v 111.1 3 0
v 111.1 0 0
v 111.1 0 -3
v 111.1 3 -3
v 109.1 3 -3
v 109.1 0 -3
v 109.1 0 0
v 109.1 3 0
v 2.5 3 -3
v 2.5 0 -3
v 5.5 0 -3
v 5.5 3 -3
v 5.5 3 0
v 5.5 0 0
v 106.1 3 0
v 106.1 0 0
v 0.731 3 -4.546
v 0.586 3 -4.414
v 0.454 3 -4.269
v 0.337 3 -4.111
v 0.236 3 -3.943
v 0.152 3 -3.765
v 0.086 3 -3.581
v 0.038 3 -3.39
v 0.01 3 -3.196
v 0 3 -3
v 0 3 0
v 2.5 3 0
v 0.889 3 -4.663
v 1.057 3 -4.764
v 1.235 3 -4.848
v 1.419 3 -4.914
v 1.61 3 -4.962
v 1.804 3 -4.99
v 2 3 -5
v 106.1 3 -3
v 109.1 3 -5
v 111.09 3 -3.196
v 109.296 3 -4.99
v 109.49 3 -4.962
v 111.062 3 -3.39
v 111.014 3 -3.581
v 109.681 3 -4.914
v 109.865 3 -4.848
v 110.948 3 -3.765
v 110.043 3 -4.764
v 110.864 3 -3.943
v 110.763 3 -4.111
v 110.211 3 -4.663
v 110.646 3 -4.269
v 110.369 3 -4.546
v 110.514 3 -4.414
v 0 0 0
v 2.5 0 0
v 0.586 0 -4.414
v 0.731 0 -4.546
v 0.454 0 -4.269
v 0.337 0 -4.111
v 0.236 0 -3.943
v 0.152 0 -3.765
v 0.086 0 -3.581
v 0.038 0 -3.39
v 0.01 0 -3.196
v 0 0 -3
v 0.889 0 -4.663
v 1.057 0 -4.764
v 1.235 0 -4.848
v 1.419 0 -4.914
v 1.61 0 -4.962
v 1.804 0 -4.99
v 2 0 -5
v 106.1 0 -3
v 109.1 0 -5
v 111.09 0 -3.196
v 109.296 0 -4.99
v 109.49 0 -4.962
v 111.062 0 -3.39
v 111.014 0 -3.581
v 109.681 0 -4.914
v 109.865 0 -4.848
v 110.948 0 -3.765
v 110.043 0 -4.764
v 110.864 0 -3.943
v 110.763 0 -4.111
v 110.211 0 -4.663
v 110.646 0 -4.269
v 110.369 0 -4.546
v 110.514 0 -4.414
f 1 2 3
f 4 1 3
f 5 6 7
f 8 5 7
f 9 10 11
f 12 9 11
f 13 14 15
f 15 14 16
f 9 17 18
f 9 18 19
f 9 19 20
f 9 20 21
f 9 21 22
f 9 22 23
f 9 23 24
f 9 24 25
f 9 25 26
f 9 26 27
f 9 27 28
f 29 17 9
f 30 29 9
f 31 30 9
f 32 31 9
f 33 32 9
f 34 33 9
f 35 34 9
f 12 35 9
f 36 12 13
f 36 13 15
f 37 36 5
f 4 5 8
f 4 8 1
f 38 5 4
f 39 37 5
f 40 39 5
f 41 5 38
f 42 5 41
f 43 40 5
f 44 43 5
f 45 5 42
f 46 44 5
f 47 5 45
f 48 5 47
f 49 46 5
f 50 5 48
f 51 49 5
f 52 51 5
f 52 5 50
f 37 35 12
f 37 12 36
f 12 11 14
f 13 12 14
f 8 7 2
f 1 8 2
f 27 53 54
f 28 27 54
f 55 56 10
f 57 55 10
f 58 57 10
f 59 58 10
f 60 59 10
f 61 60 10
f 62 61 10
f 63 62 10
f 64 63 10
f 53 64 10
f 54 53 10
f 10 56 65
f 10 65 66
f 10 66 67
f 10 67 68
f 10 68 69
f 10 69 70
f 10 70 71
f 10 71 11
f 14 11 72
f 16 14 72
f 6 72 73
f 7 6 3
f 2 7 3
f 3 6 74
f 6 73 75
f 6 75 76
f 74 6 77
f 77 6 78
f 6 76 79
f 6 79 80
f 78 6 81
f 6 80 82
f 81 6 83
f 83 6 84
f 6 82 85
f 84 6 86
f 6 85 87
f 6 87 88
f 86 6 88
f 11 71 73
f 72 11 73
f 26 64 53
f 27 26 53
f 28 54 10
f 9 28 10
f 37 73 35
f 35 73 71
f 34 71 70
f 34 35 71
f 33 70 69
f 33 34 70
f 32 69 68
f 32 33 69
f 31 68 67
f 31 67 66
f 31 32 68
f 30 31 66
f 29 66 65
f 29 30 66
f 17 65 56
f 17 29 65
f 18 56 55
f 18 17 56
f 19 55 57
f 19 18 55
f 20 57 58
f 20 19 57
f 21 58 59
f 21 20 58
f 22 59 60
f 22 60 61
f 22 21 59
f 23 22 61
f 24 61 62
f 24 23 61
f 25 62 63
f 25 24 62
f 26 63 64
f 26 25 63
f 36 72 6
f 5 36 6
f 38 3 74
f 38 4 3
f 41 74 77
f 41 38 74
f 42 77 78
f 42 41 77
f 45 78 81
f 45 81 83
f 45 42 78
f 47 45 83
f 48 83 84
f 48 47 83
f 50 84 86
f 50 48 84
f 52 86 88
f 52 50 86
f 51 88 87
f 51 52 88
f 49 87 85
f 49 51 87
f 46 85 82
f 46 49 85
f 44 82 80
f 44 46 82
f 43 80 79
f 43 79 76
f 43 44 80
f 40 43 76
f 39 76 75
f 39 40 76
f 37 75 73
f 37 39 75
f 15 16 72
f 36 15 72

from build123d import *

# Parameters (mm, degrees)
SALIENTE_EXTRUIR1_DEPTH = 3
REDONDEO1_R             = 2


with BuildPart() as part:
    # Croquis1 → Saliente-Extruir1 (new body)
    with BuildSketch(Plane(origin=(0, 0, 0), x_dir=(1, 0, 0), z_dir=(0, 1, 0))):
        Polygon((0, 0), (2.5, 0), (2.5, 3), (5.5, 3), (5.5, 0), (106.1, 0), (106.1, 3), (109.1, 3), (109.1, 0), (111.1, 0), (111.1, 5), (0, 5), align=None)
    extrude(amount=SALIENTE_EXTRUIR1_DEPTH)

    # Redondeo1
    redondeo1_edges = [part.edges().sort_by_distance(p)[0] for p in [
        (0, 1.5, -5),
        (111.1, 1.5, -5),
    ]]
    fillet(redondeo1_edges, radius=REDONDEO1_R)


solid = part.part
